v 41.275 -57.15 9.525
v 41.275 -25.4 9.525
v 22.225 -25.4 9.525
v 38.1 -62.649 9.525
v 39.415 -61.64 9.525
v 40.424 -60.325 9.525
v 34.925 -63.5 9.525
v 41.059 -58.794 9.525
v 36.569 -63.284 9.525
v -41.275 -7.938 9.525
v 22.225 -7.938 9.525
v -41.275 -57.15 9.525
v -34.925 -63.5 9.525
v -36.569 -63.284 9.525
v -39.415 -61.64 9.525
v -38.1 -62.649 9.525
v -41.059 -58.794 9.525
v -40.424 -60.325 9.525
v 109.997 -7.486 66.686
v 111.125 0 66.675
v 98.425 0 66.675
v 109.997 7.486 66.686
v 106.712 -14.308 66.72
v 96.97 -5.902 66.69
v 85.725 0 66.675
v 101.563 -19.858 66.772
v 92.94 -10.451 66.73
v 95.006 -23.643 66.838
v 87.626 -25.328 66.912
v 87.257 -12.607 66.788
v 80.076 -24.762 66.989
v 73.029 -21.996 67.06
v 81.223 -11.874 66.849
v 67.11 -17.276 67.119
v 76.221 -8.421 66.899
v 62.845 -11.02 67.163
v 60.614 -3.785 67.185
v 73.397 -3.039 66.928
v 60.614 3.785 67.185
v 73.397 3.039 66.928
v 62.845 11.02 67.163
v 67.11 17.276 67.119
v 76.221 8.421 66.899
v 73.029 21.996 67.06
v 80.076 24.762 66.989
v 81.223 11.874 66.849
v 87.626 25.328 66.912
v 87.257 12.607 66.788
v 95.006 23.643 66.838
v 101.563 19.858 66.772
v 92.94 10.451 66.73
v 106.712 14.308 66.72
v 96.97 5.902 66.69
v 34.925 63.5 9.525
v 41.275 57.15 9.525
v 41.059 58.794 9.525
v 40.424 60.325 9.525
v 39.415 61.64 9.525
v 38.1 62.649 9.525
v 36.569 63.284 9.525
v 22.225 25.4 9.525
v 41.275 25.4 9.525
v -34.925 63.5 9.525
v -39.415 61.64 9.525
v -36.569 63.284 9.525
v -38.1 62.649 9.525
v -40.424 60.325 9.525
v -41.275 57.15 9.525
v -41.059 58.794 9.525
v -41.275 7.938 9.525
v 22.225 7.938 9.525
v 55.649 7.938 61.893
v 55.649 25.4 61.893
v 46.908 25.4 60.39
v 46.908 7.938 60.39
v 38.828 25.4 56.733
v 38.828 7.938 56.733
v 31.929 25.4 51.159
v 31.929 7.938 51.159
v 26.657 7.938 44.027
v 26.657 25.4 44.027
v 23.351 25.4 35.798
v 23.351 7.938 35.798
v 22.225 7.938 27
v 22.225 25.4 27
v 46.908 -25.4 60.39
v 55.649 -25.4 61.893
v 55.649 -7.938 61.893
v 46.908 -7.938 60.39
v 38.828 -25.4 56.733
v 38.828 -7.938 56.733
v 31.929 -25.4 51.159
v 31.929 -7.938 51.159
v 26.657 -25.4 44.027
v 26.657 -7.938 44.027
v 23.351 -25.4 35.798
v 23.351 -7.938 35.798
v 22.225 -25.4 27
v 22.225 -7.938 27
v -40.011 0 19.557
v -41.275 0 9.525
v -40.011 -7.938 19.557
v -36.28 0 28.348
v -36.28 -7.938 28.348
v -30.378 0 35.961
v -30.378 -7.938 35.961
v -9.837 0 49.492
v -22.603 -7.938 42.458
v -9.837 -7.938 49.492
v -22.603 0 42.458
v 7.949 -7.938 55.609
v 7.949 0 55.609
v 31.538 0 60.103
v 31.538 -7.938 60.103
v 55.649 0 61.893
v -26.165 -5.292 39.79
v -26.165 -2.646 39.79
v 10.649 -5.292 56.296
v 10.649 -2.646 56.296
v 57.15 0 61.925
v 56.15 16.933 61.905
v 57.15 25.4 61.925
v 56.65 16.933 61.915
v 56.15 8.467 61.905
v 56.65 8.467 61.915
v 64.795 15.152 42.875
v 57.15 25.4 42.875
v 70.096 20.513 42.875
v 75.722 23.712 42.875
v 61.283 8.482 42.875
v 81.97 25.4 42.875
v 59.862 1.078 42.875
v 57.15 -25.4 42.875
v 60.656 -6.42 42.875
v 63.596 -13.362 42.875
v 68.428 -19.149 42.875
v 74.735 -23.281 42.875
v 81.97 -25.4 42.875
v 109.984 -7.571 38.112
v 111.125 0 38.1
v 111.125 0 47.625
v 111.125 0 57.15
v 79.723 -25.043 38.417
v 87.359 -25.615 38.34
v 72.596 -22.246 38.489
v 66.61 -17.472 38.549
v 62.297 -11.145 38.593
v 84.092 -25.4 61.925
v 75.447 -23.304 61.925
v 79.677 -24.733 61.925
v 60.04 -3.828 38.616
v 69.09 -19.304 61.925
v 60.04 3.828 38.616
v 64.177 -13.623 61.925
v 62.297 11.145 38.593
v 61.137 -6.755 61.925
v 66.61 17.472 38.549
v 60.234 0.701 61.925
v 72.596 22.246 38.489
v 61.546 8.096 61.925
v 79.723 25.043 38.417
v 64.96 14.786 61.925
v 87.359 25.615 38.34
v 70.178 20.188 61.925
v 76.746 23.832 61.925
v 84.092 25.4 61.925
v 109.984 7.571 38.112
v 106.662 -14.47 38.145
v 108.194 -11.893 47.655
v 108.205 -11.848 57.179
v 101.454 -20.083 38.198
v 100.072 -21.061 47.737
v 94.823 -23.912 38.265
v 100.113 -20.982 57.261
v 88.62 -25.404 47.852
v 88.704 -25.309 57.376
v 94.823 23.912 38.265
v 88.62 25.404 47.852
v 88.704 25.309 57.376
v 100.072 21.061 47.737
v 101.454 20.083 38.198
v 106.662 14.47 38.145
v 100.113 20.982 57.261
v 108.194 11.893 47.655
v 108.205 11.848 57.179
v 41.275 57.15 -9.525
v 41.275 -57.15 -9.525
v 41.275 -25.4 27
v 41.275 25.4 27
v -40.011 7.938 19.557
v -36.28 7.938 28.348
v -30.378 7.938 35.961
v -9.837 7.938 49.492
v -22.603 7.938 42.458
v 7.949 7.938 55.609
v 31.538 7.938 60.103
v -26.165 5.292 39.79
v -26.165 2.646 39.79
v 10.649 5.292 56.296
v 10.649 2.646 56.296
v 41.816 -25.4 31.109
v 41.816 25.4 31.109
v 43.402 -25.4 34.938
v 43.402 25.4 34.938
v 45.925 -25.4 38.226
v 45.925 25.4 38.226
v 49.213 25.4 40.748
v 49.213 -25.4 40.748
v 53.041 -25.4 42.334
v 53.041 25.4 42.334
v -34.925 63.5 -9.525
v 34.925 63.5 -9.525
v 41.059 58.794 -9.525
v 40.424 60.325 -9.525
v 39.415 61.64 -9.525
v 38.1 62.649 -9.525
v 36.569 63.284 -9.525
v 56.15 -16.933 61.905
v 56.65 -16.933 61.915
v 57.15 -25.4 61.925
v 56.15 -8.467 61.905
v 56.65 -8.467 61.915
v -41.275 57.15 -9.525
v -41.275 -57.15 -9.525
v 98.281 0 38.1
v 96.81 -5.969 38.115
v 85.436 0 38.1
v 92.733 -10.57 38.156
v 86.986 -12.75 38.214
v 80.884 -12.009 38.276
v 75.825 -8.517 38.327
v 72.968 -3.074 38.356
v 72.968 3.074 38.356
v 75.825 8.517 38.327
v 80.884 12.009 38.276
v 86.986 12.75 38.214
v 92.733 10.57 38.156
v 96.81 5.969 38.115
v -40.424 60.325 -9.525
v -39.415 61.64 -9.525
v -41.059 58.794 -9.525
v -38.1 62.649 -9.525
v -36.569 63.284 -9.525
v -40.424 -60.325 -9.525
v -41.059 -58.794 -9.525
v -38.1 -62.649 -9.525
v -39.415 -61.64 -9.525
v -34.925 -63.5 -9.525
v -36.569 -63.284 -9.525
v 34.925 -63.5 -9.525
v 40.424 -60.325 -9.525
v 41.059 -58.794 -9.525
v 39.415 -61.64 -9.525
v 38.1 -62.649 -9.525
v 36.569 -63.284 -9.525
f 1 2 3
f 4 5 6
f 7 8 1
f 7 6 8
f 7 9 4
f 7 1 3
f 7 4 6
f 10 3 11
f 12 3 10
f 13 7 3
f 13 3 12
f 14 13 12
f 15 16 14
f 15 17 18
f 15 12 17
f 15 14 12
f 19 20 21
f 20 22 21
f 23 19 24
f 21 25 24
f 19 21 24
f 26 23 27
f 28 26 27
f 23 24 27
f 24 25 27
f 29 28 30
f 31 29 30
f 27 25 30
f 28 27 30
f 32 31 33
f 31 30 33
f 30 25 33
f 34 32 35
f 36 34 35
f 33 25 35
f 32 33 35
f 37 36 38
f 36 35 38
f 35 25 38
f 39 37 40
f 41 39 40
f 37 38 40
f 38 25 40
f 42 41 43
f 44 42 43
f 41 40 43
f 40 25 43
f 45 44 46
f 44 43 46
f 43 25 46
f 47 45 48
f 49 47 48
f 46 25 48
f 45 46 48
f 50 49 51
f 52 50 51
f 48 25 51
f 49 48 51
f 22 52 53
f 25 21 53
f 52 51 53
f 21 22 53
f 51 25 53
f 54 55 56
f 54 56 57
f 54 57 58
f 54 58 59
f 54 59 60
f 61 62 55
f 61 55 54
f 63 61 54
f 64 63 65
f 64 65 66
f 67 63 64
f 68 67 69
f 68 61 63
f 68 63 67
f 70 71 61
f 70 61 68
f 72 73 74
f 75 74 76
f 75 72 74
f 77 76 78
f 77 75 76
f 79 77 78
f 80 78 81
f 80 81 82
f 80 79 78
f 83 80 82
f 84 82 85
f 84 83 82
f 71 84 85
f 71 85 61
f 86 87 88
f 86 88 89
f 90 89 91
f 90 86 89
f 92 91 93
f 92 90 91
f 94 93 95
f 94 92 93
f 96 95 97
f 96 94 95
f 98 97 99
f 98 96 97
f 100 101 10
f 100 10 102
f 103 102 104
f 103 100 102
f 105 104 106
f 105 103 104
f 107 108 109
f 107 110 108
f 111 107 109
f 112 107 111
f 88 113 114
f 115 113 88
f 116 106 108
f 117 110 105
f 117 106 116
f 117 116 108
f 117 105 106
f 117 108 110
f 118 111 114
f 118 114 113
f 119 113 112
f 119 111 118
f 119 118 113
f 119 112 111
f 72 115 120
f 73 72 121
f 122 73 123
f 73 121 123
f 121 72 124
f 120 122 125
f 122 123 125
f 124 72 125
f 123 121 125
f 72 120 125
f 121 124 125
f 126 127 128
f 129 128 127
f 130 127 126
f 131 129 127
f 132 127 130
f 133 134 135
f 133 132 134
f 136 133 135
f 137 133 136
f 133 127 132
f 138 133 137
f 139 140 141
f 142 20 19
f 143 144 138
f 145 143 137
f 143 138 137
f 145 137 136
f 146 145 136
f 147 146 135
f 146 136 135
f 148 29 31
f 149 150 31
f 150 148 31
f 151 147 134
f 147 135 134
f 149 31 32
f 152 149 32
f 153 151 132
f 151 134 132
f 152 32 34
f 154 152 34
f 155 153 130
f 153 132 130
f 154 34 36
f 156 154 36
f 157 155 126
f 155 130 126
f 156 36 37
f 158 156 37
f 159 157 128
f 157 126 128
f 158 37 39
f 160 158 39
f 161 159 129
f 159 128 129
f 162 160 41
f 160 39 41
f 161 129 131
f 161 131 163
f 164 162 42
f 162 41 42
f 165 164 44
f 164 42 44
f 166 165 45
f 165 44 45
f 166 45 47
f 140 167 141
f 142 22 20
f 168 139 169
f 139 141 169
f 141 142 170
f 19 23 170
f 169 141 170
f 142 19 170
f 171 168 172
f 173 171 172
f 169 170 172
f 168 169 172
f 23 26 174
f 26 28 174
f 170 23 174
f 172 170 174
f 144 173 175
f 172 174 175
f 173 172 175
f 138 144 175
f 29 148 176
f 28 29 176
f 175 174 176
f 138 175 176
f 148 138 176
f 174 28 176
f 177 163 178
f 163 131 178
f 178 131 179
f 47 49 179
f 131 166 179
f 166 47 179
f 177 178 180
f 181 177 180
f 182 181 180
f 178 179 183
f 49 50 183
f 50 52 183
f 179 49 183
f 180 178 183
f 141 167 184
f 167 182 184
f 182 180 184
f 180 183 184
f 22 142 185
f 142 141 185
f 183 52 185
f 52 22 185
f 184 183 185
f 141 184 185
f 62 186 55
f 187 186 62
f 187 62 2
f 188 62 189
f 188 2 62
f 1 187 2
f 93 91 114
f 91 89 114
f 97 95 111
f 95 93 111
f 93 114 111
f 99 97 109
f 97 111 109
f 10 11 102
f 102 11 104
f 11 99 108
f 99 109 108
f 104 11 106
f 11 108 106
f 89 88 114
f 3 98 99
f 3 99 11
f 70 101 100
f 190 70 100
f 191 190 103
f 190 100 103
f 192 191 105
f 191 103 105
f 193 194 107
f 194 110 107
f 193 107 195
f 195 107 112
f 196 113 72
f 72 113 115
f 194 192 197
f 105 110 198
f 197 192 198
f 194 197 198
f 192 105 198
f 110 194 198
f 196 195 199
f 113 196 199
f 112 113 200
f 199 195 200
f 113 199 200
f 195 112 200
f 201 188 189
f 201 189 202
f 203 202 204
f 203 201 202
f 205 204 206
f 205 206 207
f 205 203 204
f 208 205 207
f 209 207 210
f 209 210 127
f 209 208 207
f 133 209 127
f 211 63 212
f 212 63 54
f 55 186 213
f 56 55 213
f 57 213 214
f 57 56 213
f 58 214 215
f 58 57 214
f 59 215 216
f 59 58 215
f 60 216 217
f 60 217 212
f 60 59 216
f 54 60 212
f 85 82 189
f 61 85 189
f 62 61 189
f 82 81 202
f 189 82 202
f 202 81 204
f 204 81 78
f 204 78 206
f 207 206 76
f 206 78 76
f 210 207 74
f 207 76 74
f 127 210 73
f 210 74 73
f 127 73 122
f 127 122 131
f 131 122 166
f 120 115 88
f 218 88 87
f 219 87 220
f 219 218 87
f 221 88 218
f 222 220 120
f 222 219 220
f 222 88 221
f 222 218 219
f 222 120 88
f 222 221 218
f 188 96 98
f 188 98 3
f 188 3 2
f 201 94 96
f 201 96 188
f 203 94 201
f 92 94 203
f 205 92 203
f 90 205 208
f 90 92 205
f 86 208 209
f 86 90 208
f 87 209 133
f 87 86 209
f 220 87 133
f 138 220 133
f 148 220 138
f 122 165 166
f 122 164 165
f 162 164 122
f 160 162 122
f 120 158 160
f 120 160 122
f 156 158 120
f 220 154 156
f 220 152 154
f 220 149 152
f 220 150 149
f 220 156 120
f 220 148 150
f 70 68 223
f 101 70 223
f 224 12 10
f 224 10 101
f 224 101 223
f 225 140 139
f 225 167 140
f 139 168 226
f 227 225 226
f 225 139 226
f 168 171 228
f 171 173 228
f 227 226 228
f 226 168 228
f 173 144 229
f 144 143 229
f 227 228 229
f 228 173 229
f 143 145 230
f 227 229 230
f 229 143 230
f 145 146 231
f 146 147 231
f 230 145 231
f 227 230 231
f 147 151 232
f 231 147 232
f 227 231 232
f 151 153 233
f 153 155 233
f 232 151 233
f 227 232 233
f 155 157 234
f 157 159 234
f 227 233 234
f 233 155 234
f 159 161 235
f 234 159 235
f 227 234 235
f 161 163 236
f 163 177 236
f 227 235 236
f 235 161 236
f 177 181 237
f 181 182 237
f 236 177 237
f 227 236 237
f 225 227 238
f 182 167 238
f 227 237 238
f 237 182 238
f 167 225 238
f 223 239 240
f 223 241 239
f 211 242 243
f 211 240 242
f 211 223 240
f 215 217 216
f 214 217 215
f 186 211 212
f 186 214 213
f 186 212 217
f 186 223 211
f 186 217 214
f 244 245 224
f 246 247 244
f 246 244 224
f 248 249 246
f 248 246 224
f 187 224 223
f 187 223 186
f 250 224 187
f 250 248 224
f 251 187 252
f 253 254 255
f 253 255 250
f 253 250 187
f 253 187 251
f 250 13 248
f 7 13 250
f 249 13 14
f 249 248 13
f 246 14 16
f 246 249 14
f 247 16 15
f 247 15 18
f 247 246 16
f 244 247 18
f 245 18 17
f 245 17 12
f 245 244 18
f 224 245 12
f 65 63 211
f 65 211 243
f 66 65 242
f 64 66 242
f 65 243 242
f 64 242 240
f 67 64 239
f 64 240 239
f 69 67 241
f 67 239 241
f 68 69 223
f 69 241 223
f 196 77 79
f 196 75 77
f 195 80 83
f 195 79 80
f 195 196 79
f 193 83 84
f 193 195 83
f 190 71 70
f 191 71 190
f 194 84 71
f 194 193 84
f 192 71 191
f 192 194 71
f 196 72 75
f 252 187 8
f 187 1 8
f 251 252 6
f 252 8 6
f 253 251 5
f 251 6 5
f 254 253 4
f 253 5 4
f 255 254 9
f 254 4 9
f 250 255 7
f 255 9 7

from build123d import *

# Parameters (mm, degrees)
F1_DEPTH = 63.5
F2_DEPTH = 25.4
F3_DEPTH = 7.9375
F5_R     = 6.35


with BuildPart() as f1:
    # F0 (on Front) → F1 (new body, symmetric)
    with BuildSketch(Plane.XZ):
        Polygon((-41.275, 9.525), (-41.275, -9.525), (41.275, -9.525), (41.275, 9.525), (22.225, 9.525), align=None)
    extrude(amount=F1_DEPTH, both=True)

    # F0 (on Front) → F2 (join, symmetric)
    with BuildSketch(Plane.XZ):
        Polygon((85.6770387978, 61.9252), (60.325, 61.9252), (60.325, 42.8752), (85.4846810352, 42.8752), align=None)
        with BuildLine():
            Line((22.225, 9.525), (41.275, 9.525))
            Line((41.275, 9.525), (41.275, 27.0002))
            ThreePointArc((41.275, 27.0002), (45.9246798487, 38.2255201513), (57.15, 42.8752))
            Line((57.15, 42.8752), (60.325, 42.8752))
            Line((60.325, 42.8752), (60.325, 61.9252))
            Line((60.325, 61.9252), (57.15, 61.9252))
            add(Edge.make_bspline(
                [(55.6490044481, 61.8929304371), (56.1503761632, 61.905209471), (56.6507368417, 61.9159599142), (57.15, 61.9252)],
                knots=[110.2646487764, 110.2646487764, 110.2646487764, 110.2646487764, 111.5045361635, 111.5045361635, 111.5045361635, 111.5045361635], degree=3))
            ThreePointArc((55.6490044481, 61.8929304371), (31.9291961404, 51.1593944749), (22.225, 27.0002))
            Line((22.225, 27.0002), (22.225, 9.525))
        make_face()
    extrude(amount=F2_DEPTH, both=True)

    # F0 (on Front) → F3 (join, symmetric)
    with BuildSketch(Plane.XZ):
        with BuildLine():
            add(Edge.make_bspline(
                [(-41.275, 9.525), (-41.522193166, 47.6197025146), (11.061426055, 60.8009414524), (55.6490044481, 61.8929304371)],
                knots=[0, 0, 0, 0, 110.2646487764, 110.2646487764, 110.2646487764, 110.2646487764], degree=3))
            Line((-41.275, 9.525), (22.225, 9.525))
            Line((22.225, 9.525), (22.225, 27.0002))
            ThreePointArc((22.225, 27.0002), (31.9291961404, 51.1593944749), (55.6490044481, 61.8929304371))
        make_face()
    extrude(amount=F3_DEPTH, both=True)

    # F0 (on Front) → F4 (revolve)
    with BuildSketch(Plane.XZ):
        Polygon((85.725, 66.675), (85.6770387978, 61.9252), (85.4846810352, 42.8752), (85.436463356, 38.1), (111.125, 38.1), (111.125, 66.675), align=None)
    revolve(axis=Axis((85.580731678, 0, 52.3875), (-0.0100970056, 0, -0.9999490239)))

    # F5
    f5_edges = [f1.edges().sort_by_distance(p)[0] for p in [
        (-41.275, -63.5, 0),
        (41.275, -63.5, 0),
        (41.275, 63.5, 0),
        (-41.275, 63.5, 0),
    ]]
    fillet(f5_edges, radius=F5_R)


solid = f1.part
